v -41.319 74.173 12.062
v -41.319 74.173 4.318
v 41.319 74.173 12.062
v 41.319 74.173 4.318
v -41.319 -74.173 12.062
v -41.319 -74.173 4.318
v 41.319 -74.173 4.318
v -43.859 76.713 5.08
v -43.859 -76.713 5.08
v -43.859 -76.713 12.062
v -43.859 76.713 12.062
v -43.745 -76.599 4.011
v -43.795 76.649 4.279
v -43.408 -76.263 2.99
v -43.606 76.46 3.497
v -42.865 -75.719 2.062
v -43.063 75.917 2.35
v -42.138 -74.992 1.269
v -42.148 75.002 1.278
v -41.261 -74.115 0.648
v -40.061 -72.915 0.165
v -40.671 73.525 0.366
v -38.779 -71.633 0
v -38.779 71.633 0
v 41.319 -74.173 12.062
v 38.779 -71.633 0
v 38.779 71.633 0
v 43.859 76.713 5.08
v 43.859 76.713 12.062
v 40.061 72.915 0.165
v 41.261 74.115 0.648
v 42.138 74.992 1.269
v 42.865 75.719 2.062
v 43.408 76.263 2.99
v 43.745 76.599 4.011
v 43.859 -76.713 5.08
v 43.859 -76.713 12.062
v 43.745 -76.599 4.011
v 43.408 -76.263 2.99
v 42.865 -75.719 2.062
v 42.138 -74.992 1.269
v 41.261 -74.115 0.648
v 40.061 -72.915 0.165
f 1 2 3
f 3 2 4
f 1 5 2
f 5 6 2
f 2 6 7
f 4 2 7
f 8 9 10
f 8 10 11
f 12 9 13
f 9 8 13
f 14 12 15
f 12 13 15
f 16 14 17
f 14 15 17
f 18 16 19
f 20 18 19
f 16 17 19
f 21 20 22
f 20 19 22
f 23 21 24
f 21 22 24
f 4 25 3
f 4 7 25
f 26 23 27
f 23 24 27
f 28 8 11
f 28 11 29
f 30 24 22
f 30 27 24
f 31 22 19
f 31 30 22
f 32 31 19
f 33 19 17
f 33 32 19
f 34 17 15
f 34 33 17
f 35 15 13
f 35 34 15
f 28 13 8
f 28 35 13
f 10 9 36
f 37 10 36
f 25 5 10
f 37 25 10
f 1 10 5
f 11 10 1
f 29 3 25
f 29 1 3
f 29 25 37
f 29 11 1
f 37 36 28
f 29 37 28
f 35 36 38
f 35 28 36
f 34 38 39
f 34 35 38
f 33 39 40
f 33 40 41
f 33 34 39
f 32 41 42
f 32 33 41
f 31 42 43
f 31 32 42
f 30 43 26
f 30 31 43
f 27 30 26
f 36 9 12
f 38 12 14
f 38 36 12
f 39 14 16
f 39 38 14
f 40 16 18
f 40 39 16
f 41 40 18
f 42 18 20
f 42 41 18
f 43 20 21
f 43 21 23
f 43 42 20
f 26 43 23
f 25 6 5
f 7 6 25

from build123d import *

# Parameters (mm, degrees)
F0_W     = 87.7170339227
F0_H     = 153.4254997969
F1_DEPTH = 1.7726365477
F2_W     = 87.7170339227
F2_H     = 153.4254997969
F3_DEPTH = 5.9710852802
F4_T     = -2.54
F5_DEPTH = 4.318
F6_R     = 5.08


with BuildPart() as f1:
    # F0 (on Top) → F1 (new body)
    with BuildSketch(Plane.XY):
        Rectangle(F0_W, F0_H)
    extrude(amount=F1_DEPTH)

    # F2 (on face) → F3 (join)
    with BuildSketch(Plane.XY.offset(1.7726365477)):
        Rectangle(F2_W, F2_H)
    extrude(amount=F3_DEPTH)

    # F4
    f4_openings = [f1.faces().sort_by_distance(p)[0] for p in [
        (0, 0, 7.743722),
    ]]
    offset(amount=F4_T, openings=f4_openings)

    # F5 (add): faces of the model
    f5_faces = [f1.faces().sort_by_distance(p)[0] for p in [
        (-42.0912121764, 0, 7.7437218279),
        (0, 0, 0),
    ]]
    extrude(f5_faces, amount=F5_DEPTH, dir=(0, 0, 1))

    # F6
    f6_edges = [f1.edges().sort_by_distance(p)[0] for p in [
        (0, -76.71275, 0),
        (43.858517, 0, 0),
        (0, 76.71275, 0),
        (-43.858517, 0, 0),
    ]]
    fillet(f6_edges, radius=F6_R)


solid = f1.part
